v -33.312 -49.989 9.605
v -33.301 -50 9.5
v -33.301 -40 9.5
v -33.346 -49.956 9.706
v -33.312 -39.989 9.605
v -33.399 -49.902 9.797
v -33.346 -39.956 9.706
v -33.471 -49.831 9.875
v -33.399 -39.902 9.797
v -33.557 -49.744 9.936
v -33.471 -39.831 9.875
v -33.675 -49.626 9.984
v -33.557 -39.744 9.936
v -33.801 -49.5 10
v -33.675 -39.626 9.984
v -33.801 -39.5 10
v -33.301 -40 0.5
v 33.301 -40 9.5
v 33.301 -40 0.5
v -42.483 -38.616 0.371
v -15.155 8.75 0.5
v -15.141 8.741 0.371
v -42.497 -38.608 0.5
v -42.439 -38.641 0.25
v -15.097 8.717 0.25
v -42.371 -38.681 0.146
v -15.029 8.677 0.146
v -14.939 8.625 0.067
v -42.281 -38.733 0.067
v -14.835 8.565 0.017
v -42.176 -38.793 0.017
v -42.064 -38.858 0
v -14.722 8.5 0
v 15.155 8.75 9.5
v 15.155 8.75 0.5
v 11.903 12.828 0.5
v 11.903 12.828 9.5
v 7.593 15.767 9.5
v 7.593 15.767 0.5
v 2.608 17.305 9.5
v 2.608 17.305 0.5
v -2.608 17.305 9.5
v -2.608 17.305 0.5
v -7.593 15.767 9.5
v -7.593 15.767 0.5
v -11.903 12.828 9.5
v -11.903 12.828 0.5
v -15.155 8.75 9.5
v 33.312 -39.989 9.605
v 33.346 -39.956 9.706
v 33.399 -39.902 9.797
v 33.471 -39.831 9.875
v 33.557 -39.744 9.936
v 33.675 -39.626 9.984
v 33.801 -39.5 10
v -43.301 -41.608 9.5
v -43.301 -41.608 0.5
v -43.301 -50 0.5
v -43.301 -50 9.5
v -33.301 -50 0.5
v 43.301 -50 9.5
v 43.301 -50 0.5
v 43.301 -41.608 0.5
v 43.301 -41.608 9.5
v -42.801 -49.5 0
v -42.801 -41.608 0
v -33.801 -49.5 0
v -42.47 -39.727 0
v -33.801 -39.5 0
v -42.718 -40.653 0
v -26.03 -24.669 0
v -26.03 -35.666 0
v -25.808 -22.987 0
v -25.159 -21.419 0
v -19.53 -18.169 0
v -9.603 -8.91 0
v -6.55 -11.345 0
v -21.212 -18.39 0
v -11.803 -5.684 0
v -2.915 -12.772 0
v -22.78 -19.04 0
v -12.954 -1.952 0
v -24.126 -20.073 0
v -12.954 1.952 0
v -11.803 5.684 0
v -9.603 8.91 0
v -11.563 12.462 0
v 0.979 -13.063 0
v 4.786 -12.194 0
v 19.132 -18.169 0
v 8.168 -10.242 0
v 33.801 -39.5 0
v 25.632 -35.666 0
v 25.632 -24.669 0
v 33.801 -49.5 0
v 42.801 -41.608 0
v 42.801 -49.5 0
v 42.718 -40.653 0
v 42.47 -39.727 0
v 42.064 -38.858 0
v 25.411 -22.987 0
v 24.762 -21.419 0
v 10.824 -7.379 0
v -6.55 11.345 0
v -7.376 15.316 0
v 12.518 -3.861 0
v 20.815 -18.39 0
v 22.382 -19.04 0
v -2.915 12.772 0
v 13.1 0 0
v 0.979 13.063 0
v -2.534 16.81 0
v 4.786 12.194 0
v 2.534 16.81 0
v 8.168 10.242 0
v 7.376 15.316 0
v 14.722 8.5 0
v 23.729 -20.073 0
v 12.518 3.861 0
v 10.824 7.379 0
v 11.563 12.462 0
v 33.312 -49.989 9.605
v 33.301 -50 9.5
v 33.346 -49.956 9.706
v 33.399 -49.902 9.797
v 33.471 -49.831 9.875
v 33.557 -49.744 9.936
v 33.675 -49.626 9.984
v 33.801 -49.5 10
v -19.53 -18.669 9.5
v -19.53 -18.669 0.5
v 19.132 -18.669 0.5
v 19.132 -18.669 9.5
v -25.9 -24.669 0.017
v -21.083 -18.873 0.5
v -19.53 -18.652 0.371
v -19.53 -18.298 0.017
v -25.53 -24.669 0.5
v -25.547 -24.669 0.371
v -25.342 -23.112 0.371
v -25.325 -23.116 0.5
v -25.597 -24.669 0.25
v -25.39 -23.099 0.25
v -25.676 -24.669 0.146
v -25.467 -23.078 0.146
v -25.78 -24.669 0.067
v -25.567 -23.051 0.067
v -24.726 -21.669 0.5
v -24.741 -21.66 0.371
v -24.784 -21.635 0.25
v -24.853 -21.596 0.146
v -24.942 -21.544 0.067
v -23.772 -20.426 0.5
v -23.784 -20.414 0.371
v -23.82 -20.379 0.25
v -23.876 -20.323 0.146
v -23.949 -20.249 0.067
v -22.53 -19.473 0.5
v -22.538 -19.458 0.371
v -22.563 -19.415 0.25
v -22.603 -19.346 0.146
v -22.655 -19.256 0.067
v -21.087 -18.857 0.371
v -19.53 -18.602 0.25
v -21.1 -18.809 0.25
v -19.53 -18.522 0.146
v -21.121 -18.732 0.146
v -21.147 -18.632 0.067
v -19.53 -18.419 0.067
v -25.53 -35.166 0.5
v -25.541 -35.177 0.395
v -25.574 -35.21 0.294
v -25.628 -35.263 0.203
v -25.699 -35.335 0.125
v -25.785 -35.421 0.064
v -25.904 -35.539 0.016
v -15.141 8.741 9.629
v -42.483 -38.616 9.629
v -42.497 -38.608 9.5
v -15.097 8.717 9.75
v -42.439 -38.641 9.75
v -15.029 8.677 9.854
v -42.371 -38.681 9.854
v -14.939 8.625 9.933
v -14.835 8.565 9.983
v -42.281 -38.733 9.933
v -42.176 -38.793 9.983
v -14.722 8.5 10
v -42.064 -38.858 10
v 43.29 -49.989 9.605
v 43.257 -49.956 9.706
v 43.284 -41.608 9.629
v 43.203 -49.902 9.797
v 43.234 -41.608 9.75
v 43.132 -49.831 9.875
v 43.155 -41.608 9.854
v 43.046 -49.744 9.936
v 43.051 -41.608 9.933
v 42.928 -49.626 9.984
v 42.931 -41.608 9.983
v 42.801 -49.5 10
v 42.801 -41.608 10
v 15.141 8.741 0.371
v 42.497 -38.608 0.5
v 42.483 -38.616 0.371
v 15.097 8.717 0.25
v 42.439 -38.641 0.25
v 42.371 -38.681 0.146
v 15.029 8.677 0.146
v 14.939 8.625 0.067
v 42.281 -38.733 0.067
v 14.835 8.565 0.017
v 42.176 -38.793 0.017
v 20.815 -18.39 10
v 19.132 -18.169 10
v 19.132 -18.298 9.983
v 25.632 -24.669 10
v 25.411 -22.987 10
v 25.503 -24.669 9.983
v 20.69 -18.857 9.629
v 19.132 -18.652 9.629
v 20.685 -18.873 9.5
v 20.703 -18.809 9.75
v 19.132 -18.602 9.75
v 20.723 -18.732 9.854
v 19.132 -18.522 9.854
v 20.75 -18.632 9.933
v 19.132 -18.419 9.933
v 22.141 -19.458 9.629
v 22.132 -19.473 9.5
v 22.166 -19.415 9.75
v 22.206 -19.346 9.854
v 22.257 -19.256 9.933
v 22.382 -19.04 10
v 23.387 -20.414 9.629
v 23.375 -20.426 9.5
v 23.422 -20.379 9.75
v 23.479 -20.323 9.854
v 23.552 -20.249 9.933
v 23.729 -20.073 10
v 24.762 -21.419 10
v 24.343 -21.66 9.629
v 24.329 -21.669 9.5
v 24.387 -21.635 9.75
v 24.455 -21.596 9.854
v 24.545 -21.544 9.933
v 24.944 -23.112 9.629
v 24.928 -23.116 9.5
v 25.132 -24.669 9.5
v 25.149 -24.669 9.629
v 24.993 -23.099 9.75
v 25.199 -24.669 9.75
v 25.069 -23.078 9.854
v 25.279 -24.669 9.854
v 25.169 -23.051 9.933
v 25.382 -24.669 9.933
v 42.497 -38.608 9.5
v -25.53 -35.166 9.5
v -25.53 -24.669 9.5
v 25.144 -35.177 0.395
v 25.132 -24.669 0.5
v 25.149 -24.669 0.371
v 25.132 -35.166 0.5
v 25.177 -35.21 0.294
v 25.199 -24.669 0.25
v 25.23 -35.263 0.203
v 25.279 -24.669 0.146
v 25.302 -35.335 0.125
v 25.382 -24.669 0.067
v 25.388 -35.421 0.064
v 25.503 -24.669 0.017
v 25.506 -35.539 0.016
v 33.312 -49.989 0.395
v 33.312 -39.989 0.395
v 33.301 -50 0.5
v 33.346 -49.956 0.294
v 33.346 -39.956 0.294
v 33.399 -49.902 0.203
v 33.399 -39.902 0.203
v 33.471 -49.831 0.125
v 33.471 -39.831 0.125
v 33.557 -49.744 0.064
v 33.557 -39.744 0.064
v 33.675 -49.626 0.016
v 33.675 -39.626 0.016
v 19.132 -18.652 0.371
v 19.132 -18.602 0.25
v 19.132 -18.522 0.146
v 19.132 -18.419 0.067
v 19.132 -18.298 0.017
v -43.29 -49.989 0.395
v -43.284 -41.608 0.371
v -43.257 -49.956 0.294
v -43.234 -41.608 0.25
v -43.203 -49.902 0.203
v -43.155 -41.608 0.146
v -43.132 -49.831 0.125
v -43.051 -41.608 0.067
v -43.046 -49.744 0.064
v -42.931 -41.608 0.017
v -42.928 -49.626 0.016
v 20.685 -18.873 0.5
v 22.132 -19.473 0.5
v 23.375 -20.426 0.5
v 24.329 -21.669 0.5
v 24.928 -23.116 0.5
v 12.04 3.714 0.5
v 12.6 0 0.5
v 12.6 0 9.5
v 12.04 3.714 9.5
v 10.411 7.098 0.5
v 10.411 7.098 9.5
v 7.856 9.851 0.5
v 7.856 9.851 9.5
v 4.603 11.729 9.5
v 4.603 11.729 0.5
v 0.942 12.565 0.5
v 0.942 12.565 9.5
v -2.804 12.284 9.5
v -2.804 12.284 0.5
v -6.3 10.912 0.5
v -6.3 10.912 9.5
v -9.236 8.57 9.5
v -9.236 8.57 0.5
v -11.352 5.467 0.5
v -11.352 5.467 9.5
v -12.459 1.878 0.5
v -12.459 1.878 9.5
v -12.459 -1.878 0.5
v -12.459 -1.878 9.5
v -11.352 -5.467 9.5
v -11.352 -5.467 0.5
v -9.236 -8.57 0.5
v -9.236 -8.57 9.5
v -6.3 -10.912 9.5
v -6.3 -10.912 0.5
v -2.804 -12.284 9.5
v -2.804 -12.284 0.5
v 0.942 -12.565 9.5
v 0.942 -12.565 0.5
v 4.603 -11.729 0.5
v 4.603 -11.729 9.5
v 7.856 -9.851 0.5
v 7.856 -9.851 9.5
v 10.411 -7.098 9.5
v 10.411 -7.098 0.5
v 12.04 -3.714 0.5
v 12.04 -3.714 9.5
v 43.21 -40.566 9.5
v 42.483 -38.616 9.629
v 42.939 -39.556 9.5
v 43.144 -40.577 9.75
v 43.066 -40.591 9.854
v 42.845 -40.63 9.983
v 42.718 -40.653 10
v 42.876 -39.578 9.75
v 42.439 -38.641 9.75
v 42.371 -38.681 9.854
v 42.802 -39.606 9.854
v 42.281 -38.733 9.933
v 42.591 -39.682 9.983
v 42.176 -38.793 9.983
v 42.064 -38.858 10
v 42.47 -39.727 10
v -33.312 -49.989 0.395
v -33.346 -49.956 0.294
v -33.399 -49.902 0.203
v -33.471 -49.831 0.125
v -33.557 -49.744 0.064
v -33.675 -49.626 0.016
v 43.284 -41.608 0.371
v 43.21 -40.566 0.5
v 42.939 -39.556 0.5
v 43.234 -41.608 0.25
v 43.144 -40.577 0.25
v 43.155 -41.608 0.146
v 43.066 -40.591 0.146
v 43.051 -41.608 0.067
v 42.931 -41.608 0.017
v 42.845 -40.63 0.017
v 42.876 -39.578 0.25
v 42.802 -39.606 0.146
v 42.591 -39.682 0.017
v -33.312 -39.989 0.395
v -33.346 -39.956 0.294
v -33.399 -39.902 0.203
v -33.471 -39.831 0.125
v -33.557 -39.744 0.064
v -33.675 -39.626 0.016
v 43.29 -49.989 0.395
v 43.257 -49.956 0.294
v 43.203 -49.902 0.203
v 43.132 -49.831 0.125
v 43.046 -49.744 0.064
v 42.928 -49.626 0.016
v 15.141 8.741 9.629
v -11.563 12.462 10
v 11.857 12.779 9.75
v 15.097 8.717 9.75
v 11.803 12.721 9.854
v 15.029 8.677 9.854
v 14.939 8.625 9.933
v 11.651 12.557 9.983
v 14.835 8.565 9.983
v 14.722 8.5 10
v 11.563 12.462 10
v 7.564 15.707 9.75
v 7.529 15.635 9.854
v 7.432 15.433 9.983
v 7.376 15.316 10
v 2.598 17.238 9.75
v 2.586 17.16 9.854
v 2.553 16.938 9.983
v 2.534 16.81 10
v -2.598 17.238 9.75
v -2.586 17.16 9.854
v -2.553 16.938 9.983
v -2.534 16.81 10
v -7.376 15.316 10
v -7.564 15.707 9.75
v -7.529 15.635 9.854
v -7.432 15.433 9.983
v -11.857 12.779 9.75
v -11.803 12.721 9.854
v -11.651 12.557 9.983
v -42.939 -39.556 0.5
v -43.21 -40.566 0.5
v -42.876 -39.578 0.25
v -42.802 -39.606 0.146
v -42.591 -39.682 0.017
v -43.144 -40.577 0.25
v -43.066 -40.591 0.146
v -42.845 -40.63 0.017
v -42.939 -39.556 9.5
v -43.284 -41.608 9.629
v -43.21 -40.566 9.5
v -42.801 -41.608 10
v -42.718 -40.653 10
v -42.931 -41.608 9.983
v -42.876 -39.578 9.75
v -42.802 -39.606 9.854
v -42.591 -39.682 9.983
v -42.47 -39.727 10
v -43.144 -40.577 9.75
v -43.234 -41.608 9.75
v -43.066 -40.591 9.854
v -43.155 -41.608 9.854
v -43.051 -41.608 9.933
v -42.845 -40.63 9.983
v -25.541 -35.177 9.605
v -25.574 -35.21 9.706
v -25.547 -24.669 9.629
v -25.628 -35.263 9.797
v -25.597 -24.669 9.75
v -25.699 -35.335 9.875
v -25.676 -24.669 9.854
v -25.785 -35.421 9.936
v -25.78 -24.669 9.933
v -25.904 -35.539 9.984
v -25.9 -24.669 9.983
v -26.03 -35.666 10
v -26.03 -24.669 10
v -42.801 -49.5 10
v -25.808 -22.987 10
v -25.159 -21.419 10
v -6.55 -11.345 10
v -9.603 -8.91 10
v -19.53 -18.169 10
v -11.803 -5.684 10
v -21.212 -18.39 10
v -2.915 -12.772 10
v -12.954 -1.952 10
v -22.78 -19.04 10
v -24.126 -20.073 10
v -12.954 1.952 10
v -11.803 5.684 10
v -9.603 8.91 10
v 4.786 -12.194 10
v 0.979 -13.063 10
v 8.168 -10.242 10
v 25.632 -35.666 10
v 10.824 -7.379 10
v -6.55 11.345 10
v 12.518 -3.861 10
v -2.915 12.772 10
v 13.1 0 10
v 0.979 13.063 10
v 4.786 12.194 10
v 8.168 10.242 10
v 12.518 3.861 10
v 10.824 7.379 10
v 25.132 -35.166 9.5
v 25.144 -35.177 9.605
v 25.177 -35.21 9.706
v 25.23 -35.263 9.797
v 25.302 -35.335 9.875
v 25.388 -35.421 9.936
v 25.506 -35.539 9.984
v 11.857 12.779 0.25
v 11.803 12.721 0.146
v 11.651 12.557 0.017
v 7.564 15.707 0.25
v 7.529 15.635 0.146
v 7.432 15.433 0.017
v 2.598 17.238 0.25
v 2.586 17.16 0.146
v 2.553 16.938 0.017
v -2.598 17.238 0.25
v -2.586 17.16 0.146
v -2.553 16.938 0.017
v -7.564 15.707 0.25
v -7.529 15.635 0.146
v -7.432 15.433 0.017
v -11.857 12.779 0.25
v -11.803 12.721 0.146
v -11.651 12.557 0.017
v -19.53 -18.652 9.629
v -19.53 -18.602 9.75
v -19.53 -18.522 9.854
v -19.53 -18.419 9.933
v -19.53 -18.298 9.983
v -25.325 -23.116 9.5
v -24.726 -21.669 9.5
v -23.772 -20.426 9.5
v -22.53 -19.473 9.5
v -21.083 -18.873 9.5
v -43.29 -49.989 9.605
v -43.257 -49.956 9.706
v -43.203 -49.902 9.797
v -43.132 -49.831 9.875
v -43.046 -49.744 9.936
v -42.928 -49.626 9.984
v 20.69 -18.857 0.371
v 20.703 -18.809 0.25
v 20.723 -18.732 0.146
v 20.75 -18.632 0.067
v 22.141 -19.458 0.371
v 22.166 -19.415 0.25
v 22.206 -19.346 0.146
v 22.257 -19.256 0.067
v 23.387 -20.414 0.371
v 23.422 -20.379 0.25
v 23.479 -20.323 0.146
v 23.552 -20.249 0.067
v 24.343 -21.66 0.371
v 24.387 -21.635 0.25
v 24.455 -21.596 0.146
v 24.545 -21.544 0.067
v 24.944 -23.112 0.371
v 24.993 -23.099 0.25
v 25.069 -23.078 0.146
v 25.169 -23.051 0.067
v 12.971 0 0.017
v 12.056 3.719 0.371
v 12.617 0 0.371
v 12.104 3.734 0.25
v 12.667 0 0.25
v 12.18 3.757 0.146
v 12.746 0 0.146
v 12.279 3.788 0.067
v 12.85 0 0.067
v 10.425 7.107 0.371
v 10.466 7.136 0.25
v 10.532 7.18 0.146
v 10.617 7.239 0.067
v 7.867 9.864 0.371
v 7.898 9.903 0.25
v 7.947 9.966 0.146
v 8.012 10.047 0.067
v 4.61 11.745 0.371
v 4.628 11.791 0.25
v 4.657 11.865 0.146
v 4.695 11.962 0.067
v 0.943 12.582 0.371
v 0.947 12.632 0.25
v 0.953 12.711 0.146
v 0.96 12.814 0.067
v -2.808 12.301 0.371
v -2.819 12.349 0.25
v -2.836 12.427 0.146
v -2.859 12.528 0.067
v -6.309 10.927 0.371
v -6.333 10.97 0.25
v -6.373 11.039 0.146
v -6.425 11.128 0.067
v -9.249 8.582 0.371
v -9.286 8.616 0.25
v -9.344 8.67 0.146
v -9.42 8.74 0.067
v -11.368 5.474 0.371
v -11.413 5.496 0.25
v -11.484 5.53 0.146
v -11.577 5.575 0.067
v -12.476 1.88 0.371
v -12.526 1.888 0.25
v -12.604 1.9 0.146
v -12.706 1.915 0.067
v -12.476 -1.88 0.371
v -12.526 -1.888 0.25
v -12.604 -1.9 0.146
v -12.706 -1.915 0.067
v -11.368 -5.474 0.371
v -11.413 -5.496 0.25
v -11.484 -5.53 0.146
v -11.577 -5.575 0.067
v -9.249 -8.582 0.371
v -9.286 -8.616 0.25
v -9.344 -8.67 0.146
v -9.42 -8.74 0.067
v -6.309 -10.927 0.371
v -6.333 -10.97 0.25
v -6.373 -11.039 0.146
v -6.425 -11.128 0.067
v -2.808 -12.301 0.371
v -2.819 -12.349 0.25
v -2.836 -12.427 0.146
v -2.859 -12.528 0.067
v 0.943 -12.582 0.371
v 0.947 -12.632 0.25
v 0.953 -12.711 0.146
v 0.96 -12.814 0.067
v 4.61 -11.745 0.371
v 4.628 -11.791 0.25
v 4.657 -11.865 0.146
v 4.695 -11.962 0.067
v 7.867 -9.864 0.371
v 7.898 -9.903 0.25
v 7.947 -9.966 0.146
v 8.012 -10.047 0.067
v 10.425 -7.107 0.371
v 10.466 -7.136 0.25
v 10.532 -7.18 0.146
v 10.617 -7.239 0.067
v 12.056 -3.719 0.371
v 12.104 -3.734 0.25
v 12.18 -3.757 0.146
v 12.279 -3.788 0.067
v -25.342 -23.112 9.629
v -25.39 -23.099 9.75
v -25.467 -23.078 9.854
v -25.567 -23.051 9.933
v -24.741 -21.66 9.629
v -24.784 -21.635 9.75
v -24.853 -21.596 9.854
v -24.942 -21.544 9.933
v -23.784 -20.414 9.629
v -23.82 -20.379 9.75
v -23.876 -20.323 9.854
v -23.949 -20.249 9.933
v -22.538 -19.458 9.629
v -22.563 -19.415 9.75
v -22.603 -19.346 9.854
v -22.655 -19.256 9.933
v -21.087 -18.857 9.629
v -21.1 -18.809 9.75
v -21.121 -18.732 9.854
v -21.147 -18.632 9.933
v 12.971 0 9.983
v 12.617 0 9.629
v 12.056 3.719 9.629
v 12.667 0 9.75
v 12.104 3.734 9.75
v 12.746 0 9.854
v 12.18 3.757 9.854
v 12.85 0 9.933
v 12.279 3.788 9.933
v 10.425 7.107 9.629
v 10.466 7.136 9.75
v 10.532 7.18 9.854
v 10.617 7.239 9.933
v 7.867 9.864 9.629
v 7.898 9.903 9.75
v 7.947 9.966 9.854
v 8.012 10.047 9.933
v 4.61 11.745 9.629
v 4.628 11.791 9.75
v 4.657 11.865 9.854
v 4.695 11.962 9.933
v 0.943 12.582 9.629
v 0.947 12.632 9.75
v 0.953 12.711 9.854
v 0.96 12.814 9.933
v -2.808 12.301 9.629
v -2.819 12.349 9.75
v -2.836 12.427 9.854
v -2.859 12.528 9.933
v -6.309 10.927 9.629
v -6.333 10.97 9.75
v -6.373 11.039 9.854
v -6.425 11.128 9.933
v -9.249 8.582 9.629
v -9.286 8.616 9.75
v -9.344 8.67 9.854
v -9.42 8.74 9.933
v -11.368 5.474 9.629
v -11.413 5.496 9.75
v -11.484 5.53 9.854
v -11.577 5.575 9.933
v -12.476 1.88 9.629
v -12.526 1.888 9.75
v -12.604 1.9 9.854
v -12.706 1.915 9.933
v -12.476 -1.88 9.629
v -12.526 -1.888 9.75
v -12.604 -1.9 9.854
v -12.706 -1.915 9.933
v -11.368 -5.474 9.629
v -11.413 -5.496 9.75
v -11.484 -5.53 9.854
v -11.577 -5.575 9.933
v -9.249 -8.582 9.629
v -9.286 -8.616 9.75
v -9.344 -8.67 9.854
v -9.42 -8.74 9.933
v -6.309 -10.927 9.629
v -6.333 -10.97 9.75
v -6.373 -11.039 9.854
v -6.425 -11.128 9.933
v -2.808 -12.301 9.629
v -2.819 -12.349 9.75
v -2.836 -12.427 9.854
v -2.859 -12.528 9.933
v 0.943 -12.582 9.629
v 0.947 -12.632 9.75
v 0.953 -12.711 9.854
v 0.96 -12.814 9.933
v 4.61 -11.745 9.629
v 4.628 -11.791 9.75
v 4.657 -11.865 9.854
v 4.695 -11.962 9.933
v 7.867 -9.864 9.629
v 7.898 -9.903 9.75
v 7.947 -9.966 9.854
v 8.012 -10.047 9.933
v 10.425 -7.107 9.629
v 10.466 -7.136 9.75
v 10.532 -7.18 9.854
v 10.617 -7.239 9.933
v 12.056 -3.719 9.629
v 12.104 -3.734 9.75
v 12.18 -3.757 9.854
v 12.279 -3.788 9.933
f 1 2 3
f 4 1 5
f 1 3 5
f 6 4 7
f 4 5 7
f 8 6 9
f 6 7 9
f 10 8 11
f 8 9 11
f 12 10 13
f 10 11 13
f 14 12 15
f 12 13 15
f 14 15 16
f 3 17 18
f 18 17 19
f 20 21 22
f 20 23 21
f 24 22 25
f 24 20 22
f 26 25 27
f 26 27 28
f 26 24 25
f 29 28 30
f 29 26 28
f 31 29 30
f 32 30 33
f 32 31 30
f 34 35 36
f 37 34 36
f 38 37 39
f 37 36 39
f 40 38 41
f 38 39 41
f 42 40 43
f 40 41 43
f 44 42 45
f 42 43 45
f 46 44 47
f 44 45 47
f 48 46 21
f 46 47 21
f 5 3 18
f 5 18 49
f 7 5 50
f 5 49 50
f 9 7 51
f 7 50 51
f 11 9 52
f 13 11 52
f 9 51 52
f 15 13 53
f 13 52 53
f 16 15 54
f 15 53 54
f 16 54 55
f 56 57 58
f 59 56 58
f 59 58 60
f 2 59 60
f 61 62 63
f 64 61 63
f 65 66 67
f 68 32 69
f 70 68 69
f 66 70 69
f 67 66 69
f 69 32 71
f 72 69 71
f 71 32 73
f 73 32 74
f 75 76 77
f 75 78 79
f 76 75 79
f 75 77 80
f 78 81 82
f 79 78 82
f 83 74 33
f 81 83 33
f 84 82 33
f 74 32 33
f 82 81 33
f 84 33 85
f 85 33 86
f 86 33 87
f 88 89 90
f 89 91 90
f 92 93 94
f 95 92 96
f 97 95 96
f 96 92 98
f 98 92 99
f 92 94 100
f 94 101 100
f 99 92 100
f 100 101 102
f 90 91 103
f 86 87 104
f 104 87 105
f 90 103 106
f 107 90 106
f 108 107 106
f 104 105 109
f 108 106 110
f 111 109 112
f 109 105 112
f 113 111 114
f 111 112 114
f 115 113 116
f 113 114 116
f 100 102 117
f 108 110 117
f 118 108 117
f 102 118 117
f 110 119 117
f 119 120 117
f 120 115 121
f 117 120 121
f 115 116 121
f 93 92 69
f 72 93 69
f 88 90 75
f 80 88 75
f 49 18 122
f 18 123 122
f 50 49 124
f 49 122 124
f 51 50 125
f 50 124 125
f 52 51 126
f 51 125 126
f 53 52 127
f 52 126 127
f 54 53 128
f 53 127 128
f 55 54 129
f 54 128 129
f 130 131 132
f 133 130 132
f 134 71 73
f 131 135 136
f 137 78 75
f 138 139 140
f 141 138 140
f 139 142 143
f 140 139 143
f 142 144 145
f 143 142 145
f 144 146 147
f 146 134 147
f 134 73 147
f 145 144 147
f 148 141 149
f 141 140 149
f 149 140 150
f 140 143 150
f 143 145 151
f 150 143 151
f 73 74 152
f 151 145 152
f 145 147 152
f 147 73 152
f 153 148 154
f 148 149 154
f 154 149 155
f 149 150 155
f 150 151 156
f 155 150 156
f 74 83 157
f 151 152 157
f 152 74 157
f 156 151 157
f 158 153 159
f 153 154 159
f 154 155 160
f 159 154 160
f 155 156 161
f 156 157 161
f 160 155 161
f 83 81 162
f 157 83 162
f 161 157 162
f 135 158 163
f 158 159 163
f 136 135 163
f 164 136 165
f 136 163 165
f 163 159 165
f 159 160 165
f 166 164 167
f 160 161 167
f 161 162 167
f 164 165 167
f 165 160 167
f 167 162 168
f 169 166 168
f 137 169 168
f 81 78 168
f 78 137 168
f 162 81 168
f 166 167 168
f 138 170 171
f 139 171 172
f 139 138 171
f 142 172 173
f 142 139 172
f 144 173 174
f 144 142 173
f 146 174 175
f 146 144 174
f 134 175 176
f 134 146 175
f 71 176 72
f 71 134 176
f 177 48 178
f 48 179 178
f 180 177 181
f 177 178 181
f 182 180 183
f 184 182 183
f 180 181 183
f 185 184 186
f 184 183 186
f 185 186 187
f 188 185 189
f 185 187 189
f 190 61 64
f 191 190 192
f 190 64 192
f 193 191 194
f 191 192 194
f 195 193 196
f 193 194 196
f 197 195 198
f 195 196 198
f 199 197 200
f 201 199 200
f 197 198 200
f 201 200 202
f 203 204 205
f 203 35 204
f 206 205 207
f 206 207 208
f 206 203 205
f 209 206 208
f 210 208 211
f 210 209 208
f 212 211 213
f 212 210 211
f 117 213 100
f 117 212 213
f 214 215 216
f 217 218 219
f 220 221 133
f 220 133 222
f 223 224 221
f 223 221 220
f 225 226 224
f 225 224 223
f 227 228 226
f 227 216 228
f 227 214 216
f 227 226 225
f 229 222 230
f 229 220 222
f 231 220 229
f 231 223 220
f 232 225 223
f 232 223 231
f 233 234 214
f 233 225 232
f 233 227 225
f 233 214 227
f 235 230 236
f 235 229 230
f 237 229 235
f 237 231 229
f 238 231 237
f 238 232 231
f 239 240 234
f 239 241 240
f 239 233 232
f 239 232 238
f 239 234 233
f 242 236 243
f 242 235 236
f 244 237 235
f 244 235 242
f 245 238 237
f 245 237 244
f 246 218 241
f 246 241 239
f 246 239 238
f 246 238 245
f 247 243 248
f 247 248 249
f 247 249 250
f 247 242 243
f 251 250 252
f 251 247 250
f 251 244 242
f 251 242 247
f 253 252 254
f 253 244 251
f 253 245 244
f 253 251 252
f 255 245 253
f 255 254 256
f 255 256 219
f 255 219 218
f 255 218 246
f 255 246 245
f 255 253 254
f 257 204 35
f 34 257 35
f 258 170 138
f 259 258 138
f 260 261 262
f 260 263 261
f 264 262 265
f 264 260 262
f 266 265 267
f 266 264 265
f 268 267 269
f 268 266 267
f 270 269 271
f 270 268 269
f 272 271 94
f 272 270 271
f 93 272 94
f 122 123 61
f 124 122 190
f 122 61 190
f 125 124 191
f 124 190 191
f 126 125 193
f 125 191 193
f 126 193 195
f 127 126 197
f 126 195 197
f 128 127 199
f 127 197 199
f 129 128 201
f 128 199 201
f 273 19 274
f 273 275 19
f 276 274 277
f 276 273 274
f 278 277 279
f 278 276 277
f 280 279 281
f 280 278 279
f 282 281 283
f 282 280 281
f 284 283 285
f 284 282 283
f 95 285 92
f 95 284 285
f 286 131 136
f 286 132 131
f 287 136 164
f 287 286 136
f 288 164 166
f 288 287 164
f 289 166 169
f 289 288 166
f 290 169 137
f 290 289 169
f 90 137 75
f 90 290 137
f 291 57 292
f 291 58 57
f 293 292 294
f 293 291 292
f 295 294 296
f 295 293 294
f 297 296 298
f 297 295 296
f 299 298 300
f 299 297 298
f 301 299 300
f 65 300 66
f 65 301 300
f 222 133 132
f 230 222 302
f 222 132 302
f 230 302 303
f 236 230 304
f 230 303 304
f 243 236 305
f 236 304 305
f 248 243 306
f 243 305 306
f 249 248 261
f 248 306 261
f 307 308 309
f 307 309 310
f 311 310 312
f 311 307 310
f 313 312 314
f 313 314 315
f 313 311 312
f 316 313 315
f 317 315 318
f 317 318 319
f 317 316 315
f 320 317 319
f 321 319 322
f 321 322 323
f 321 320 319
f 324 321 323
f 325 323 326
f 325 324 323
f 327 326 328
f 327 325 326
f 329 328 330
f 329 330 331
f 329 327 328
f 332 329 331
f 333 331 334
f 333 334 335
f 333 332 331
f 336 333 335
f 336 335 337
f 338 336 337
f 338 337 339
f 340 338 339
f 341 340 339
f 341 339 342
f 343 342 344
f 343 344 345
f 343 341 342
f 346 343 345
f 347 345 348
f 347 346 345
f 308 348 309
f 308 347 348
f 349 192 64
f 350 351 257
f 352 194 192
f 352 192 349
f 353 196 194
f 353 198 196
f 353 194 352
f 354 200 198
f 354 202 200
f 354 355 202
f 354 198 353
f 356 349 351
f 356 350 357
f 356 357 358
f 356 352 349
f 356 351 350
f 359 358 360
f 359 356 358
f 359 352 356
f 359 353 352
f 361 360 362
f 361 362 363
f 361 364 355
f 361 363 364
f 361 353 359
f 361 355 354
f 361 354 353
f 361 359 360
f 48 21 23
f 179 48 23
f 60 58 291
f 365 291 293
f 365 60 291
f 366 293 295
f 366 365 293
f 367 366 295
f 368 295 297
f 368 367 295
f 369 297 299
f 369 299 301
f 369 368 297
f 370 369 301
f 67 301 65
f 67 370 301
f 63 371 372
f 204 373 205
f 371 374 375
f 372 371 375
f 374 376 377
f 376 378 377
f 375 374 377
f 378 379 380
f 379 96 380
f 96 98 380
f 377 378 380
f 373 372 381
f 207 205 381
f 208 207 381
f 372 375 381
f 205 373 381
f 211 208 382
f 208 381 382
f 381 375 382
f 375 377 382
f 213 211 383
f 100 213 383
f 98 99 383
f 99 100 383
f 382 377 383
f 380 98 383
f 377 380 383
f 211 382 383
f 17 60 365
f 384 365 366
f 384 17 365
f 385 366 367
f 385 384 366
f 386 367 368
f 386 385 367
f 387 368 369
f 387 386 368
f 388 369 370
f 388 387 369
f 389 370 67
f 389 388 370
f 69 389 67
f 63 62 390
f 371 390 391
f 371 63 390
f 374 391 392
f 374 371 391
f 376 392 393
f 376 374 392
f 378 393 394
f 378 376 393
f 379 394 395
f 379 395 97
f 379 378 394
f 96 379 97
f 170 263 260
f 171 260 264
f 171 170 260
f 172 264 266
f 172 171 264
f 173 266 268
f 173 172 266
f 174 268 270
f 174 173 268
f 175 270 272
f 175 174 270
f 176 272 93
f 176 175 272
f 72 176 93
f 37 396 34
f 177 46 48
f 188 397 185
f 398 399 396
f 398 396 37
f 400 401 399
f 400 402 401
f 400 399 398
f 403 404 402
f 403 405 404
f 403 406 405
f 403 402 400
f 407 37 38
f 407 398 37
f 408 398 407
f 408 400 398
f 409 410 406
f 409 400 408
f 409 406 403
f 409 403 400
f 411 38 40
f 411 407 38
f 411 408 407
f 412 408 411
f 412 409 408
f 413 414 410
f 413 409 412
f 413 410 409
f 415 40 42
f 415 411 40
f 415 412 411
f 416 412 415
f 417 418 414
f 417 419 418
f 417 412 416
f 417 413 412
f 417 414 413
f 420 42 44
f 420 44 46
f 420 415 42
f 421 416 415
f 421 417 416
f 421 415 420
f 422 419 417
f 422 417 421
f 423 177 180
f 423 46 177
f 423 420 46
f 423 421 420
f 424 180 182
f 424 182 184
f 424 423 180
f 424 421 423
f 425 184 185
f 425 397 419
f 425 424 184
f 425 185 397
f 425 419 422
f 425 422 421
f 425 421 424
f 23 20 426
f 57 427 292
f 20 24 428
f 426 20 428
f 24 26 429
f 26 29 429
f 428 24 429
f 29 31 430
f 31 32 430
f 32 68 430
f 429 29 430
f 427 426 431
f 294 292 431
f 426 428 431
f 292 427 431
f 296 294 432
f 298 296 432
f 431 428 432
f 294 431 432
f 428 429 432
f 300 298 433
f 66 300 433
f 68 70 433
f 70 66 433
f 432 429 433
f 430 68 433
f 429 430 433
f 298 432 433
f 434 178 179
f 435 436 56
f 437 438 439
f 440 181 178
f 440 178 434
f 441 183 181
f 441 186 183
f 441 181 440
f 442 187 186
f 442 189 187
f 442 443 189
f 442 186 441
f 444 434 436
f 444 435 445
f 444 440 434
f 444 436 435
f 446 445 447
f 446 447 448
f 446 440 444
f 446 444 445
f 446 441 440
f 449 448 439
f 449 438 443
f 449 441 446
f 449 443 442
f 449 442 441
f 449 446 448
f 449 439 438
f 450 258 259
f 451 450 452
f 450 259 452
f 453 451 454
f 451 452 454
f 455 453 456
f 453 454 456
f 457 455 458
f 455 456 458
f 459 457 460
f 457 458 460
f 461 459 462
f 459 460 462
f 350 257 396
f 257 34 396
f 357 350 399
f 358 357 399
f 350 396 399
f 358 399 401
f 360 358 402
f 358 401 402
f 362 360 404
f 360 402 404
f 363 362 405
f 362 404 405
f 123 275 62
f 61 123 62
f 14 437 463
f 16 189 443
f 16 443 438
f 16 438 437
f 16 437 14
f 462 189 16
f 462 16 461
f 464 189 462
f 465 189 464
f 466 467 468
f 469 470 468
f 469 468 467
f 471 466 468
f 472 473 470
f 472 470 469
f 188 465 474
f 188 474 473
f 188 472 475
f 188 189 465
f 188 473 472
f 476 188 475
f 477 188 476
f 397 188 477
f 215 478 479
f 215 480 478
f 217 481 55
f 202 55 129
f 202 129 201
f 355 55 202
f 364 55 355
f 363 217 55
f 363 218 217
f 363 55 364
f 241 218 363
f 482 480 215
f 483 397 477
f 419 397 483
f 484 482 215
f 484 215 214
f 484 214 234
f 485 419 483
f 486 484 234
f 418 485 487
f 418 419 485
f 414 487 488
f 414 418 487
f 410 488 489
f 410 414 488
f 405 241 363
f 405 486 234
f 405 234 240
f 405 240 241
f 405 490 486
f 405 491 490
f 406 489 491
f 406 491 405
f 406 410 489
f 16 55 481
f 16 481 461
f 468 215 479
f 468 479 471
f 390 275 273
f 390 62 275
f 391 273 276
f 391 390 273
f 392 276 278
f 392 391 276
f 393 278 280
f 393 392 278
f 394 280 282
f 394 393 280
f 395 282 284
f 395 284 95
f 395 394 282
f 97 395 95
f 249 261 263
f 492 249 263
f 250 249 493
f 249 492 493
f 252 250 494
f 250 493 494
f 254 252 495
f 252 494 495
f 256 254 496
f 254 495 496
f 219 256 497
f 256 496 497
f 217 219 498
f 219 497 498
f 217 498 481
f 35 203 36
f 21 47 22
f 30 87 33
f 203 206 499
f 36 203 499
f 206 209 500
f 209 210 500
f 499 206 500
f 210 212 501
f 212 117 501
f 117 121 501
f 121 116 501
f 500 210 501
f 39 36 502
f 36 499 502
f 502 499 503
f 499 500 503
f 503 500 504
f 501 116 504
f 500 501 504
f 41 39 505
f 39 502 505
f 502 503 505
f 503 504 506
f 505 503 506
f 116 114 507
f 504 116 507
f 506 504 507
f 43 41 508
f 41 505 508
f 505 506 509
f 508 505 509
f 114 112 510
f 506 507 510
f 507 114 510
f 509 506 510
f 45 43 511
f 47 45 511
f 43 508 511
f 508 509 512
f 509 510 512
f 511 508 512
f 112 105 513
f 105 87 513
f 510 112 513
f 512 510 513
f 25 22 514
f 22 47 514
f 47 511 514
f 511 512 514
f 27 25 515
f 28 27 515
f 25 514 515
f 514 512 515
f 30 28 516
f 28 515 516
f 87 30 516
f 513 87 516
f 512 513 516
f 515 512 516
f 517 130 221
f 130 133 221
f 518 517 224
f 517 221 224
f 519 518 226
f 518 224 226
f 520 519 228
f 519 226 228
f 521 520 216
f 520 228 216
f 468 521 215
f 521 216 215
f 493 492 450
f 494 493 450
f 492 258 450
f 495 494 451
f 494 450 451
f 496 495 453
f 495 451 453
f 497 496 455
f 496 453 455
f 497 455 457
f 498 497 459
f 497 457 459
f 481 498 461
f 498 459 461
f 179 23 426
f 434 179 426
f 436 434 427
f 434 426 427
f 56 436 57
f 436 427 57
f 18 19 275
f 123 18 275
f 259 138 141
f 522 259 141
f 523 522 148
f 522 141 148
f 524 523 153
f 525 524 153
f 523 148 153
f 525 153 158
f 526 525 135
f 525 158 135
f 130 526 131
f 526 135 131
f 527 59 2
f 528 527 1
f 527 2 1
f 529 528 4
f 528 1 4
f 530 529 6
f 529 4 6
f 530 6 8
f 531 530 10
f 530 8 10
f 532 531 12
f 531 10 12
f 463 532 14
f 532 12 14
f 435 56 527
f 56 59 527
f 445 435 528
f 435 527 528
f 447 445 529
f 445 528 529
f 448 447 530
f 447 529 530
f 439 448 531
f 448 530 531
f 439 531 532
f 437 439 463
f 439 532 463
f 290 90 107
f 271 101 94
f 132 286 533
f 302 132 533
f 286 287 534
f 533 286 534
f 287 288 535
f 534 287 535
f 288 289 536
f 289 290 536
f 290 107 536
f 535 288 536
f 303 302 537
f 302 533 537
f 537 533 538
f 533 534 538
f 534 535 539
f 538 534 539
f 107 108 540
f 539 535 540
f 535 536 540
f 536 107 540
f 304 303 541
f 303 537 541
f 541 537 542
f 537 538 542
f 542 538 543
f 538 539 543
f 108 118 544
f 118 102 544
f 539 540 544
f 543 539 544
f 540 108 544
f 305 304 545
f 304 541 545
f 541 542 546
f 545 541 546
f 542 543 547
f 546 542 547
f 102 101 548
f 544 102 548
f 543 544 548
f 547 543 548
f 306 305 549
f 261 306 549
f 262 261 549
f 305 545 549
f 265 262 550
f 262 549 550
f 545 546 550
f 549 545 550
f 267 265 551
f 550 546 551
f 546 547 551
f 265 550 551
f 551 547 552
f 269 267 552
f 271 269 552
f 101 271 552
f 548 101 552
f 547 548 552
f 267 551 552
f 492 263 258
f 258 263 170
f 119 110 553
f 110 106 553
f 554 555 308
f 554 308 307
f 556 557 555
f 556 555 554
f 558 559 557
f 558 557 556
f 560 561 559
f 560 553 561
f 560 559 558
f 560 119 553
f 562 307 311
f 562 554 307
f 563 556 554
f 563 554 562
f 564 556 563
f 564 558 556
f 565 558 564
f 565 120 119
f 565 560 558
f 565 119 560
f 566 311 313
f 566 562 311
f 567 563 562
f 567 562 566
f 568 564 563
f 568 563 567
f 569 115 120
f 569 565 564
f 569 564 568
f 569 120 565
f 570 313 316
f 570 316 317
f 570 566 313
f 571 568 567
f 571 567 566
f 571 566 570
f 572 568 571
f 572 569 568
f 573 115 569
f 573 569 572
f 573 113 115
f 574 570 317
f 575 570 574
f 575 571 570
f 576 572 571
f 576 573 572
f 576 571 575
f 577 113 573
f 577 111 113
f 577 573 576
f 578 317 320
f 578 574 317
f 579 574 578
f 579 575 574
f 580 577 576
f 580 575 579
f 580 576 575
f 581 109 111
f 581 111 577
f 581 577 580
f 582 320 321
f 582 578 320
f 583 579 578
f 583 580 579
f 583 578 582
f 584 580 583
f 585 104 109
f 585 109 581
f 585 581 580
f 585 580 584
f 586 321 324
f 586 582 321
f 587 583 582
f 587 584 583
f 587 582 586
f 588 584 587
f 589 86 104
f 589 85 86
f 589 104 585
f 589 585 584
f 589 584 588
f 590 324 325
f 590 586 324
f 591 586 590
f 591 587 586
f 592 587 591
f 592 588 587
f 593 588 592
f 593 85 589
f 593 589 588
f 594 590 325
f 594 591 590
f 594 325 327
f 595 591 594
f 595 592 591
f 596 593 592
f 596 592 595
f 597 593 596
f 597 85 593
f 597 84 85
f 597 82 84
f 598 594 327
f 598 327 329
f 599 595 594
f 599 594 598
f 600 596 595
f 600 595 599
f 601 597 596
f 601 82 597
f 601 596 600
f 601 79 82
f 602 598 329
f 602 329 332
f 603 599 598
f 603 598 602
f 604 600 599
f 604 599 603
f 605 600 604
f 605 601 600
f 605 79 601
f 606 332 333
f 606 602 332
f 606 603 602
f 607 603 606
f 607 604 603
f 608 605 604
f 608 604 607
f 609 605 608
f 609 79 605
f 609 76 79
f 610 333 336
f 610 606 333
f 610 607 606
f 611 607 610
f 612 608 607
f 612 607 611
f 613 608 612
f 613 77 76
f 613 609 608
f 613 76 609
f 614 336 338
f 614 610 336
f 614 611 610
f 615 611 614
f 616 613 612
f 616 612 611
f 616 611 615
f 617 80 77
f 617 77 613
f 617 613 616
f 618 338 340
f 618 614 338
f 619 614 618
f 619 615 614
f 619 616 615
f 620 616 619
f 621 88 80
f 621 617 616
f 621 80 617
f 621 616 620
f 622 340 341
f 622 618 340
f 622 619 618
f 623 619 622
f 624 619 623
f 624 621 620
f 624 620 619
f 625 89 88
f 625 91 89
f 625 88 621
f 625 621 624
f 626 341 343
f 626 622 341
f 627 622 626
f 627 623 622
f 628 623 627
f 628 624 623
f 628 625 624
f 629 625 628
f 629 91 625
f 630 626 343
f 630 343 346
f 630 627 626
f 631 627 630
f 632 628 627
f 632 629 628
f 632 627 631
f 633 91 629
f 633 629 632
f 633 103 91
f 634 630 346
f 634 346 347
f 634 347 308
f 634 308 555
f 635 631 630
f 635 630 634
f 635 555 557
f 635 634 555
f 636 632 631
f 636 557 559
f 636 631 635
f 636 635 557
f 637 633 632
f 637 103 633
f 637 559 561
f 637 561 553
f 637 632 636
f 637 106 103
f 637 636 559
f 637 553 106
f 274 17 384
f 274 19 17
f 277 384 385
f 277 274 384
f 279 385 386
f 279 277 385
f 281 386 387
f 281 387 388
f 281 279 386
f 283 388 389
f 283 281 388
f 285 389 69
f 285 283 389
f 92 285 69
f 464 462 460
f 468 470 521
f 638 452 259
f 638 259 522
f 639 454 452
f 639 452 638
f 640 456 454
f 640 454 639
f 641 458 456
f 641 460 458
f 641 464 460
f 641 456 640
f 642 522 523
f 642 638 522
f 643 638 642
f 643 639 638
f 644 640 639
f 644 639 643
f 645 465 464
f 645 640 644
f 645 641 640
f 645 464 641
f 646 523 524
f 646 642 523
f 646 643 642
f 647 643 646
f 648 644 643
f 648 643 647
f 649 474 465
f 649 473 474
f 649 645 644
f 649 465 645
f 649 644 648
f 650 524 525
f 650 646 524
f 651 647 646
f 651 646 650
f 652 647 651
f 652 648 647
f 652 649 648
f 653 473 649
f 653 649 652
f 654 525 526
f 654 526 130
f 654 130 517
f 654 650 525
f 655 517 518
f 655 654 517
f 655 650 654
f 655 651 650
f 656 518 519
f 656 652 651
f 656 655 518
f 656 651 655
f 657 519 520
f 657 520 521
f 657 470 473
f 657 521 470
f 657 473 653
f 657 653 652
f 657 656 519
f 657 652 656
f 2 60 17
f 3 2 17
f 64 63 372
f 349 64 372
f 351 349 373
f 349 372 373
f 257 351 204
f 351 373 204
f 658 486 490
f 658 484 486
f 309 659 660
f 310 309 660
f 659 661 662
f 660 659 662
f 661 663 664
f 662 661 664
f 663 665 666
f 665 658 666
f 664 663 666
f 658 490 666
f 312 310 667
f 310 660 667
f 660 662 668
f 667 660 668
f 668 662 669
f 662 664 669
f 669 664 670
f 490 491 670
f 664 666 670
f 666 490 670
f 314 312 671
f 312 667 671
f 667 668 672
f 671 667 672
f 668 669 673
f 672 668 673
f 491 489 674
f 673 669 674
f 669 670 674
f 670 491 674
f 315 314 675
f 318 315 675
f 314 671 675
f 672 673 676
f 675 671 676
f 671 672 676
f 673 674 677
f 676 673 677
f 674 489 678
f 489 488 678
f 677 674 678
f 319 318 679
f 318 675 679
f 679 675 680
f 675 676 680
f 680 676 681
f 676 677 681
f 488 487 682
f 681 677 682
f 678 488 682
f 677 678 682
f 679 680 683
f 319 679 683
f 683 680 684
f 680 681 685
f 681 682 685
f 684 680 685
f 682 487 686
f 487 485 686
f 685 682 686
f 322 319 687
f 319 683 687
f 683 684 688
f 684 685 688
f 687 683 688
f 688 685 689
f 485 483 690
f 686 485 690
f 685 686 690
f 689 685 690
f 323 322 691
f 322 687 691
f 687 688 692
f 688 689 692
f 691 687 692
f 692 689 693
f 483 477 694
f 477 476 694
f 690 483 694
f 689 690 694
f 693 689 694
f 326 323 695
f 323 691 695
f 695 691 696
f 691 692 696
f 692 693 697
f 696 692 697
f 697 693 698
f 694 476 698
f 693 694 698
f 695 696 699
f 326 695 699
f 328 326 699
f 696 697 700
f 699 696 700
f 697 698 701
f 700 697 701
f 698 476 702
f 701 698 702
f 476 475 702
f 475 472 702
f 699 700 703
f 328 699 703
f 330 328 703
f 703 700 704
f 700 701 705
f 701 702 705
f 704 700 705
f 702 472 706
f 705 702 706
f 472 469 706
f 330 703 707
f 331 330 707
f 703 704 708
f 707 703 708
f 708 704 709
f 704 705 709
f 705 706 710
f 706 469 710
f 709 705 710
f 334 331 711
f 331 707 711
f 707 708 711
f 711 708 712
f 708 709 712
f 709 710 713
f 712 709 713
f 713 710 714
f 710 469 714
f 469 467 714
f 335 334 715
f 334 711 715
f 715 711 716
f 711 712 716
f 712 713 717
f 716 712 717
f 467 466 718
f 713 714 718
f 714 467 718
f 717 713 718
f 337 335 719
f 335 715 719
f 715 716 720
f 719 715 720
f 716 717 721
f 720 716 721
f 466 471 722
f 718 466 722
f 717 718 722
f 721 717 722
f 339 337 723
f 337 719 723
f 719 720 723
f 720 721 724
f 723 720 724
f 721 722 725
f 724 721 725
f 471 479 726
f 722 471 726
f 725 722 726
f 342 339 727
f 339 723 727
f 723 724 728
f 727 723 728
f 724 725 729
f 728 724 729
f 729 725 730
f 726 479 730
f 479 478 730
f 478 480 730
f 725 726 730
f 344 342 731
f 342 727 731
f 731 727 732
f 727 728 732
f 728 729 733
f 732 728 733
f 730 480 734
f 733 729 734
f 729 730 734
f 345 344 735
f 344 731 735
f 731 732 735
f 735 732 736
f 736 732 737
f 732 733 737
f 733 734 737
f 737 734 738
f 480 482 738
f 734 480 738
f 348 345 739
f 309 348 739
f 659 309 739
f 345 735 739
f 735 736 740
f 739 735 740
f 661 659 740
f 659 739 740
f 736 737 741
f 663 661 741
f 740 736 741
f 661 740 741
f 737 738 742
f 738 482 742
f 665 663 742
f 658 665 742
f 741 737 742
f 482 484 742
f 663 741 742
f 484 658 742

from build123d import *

# Parameters (mm, degrees)
F0_R     = 12.6
F1_DEPTH = 10
F2_R     = 0.5


with BuildPart() as f1:
    # F0 (on Top) → F1 (new body)
    with BuildSketch(Plane.XY):
        with BuildLine():
            Line((42.497423, -38.607695), (15.155445, 8.75))
            ThreePointArc((15.155445, 8.75), (0, 17.5), (-15.155445, 8.75))
            Line((-15.155445, 8.75), (-42.497423, -38.607695))
            ThreePointArc((-42.497423, -38.607695), (-43.096825, -40.054781), (-43.30127, -41.607695))
            Line((-43.30127, -41.607695), (-43.30127, -50))
            Line((-43.30127, -50), (-33.30127, -50))
            Line((-33.30127, -50), (-33.30127, -40))
            Line((-33.30127, -40), (33.30127, -40))
            Line((33.30127, -40), (33.30127, -50))
            Line((33.30127, -50), (43.30127, -50))
            Line((43.30127, -50), (43.30127, -41.607695))
            ThreePointArc((43.30127, -41.607695), (43.096825, -40.054781), (42.497423, -38.607695))
        make_face()
        with BuildLine():
            Line((-19.529804, -18.668883), (19.132447, -18.668883))
            ThreePointArc((19.132447, -18.668883), (23.375088, -20.426242), (25.132447, -24.668883))
            Line((25.132447, -24.668883), (25.132447, -35.165567))
            Line((25.132447, -35.165567), (-25.529804, -35.165567))
            Line((-25.529804, -35.165567), (-25.529804, -24.668883))
            ThreePointArc((-25.529804, -24.668883), (-23.772444, -20.426242), (-19.529804, -18.668883))
        make_face(mode=Mode.SUBTRACT)
        Circle(F0_R, mode=Mode.SUBTRACT)
    extrude(amount=F1_DEPTH)

    # F2
    f2_edges = [f1.edges().sort_by_distance(p)[0] for p in [
        (28.826434, -14.928848, 10),
        (0, 17.5, 10),
        (-28.826434, -14.928848, 10),
        (-43.096825, -40.054781, 10),
        (-43.30127, -45.803848, 10),
        (-38.30127, -50, 10),
        (-33.30127, -45, 10),
        (0, -40, 10),
        (33.30127, -45, 10),
        (38.30127, -50, 10),
        (43.30127, -45.803848, 10),
        (43.096825, -40.054781, 10),
        (-0.198678, -18.668883, 10),
        (23.375088, -20.426242, 10),
        (25.132447, -29.917225, 10),
        (-0.198678, -35.165567, 10),
        (-25.529804, -29.917225, 10),
        (-23.772444, -20.426242, 10),
        (-12.6, 0, 10),
        (28.826434, -14.928848, 0),
        (0, 17.5, 0),
        (-28.826434, -14.928848, 0),
        (-43.096825, -40.054781, 0),
        (-43.30127, -45.803848, 0),
        (-38.30127, -50, 0),
        (-33.30127, -45, 0),
        (0, -40, 0),
        (33.30127, -45, 0),
        (38.30127, -50, 0),
        (43.30127, -45.803848, 0),
        (43.096825, -40.054781, 0),
        (-0.198678, -18.668883, 0),
        (23.375088, -20.426242, 0),
        (25.132447, -29.917225, 0),
        (-0.198678, -35.165567, 0),
        (-25.529804, -29.917225, 0),
        (-23.772444, -20.426242, 0),
        (-12.6, 0, 0),
    ]]
    fillet(f2_edges, radius=F2_R)


solid = f1.part
